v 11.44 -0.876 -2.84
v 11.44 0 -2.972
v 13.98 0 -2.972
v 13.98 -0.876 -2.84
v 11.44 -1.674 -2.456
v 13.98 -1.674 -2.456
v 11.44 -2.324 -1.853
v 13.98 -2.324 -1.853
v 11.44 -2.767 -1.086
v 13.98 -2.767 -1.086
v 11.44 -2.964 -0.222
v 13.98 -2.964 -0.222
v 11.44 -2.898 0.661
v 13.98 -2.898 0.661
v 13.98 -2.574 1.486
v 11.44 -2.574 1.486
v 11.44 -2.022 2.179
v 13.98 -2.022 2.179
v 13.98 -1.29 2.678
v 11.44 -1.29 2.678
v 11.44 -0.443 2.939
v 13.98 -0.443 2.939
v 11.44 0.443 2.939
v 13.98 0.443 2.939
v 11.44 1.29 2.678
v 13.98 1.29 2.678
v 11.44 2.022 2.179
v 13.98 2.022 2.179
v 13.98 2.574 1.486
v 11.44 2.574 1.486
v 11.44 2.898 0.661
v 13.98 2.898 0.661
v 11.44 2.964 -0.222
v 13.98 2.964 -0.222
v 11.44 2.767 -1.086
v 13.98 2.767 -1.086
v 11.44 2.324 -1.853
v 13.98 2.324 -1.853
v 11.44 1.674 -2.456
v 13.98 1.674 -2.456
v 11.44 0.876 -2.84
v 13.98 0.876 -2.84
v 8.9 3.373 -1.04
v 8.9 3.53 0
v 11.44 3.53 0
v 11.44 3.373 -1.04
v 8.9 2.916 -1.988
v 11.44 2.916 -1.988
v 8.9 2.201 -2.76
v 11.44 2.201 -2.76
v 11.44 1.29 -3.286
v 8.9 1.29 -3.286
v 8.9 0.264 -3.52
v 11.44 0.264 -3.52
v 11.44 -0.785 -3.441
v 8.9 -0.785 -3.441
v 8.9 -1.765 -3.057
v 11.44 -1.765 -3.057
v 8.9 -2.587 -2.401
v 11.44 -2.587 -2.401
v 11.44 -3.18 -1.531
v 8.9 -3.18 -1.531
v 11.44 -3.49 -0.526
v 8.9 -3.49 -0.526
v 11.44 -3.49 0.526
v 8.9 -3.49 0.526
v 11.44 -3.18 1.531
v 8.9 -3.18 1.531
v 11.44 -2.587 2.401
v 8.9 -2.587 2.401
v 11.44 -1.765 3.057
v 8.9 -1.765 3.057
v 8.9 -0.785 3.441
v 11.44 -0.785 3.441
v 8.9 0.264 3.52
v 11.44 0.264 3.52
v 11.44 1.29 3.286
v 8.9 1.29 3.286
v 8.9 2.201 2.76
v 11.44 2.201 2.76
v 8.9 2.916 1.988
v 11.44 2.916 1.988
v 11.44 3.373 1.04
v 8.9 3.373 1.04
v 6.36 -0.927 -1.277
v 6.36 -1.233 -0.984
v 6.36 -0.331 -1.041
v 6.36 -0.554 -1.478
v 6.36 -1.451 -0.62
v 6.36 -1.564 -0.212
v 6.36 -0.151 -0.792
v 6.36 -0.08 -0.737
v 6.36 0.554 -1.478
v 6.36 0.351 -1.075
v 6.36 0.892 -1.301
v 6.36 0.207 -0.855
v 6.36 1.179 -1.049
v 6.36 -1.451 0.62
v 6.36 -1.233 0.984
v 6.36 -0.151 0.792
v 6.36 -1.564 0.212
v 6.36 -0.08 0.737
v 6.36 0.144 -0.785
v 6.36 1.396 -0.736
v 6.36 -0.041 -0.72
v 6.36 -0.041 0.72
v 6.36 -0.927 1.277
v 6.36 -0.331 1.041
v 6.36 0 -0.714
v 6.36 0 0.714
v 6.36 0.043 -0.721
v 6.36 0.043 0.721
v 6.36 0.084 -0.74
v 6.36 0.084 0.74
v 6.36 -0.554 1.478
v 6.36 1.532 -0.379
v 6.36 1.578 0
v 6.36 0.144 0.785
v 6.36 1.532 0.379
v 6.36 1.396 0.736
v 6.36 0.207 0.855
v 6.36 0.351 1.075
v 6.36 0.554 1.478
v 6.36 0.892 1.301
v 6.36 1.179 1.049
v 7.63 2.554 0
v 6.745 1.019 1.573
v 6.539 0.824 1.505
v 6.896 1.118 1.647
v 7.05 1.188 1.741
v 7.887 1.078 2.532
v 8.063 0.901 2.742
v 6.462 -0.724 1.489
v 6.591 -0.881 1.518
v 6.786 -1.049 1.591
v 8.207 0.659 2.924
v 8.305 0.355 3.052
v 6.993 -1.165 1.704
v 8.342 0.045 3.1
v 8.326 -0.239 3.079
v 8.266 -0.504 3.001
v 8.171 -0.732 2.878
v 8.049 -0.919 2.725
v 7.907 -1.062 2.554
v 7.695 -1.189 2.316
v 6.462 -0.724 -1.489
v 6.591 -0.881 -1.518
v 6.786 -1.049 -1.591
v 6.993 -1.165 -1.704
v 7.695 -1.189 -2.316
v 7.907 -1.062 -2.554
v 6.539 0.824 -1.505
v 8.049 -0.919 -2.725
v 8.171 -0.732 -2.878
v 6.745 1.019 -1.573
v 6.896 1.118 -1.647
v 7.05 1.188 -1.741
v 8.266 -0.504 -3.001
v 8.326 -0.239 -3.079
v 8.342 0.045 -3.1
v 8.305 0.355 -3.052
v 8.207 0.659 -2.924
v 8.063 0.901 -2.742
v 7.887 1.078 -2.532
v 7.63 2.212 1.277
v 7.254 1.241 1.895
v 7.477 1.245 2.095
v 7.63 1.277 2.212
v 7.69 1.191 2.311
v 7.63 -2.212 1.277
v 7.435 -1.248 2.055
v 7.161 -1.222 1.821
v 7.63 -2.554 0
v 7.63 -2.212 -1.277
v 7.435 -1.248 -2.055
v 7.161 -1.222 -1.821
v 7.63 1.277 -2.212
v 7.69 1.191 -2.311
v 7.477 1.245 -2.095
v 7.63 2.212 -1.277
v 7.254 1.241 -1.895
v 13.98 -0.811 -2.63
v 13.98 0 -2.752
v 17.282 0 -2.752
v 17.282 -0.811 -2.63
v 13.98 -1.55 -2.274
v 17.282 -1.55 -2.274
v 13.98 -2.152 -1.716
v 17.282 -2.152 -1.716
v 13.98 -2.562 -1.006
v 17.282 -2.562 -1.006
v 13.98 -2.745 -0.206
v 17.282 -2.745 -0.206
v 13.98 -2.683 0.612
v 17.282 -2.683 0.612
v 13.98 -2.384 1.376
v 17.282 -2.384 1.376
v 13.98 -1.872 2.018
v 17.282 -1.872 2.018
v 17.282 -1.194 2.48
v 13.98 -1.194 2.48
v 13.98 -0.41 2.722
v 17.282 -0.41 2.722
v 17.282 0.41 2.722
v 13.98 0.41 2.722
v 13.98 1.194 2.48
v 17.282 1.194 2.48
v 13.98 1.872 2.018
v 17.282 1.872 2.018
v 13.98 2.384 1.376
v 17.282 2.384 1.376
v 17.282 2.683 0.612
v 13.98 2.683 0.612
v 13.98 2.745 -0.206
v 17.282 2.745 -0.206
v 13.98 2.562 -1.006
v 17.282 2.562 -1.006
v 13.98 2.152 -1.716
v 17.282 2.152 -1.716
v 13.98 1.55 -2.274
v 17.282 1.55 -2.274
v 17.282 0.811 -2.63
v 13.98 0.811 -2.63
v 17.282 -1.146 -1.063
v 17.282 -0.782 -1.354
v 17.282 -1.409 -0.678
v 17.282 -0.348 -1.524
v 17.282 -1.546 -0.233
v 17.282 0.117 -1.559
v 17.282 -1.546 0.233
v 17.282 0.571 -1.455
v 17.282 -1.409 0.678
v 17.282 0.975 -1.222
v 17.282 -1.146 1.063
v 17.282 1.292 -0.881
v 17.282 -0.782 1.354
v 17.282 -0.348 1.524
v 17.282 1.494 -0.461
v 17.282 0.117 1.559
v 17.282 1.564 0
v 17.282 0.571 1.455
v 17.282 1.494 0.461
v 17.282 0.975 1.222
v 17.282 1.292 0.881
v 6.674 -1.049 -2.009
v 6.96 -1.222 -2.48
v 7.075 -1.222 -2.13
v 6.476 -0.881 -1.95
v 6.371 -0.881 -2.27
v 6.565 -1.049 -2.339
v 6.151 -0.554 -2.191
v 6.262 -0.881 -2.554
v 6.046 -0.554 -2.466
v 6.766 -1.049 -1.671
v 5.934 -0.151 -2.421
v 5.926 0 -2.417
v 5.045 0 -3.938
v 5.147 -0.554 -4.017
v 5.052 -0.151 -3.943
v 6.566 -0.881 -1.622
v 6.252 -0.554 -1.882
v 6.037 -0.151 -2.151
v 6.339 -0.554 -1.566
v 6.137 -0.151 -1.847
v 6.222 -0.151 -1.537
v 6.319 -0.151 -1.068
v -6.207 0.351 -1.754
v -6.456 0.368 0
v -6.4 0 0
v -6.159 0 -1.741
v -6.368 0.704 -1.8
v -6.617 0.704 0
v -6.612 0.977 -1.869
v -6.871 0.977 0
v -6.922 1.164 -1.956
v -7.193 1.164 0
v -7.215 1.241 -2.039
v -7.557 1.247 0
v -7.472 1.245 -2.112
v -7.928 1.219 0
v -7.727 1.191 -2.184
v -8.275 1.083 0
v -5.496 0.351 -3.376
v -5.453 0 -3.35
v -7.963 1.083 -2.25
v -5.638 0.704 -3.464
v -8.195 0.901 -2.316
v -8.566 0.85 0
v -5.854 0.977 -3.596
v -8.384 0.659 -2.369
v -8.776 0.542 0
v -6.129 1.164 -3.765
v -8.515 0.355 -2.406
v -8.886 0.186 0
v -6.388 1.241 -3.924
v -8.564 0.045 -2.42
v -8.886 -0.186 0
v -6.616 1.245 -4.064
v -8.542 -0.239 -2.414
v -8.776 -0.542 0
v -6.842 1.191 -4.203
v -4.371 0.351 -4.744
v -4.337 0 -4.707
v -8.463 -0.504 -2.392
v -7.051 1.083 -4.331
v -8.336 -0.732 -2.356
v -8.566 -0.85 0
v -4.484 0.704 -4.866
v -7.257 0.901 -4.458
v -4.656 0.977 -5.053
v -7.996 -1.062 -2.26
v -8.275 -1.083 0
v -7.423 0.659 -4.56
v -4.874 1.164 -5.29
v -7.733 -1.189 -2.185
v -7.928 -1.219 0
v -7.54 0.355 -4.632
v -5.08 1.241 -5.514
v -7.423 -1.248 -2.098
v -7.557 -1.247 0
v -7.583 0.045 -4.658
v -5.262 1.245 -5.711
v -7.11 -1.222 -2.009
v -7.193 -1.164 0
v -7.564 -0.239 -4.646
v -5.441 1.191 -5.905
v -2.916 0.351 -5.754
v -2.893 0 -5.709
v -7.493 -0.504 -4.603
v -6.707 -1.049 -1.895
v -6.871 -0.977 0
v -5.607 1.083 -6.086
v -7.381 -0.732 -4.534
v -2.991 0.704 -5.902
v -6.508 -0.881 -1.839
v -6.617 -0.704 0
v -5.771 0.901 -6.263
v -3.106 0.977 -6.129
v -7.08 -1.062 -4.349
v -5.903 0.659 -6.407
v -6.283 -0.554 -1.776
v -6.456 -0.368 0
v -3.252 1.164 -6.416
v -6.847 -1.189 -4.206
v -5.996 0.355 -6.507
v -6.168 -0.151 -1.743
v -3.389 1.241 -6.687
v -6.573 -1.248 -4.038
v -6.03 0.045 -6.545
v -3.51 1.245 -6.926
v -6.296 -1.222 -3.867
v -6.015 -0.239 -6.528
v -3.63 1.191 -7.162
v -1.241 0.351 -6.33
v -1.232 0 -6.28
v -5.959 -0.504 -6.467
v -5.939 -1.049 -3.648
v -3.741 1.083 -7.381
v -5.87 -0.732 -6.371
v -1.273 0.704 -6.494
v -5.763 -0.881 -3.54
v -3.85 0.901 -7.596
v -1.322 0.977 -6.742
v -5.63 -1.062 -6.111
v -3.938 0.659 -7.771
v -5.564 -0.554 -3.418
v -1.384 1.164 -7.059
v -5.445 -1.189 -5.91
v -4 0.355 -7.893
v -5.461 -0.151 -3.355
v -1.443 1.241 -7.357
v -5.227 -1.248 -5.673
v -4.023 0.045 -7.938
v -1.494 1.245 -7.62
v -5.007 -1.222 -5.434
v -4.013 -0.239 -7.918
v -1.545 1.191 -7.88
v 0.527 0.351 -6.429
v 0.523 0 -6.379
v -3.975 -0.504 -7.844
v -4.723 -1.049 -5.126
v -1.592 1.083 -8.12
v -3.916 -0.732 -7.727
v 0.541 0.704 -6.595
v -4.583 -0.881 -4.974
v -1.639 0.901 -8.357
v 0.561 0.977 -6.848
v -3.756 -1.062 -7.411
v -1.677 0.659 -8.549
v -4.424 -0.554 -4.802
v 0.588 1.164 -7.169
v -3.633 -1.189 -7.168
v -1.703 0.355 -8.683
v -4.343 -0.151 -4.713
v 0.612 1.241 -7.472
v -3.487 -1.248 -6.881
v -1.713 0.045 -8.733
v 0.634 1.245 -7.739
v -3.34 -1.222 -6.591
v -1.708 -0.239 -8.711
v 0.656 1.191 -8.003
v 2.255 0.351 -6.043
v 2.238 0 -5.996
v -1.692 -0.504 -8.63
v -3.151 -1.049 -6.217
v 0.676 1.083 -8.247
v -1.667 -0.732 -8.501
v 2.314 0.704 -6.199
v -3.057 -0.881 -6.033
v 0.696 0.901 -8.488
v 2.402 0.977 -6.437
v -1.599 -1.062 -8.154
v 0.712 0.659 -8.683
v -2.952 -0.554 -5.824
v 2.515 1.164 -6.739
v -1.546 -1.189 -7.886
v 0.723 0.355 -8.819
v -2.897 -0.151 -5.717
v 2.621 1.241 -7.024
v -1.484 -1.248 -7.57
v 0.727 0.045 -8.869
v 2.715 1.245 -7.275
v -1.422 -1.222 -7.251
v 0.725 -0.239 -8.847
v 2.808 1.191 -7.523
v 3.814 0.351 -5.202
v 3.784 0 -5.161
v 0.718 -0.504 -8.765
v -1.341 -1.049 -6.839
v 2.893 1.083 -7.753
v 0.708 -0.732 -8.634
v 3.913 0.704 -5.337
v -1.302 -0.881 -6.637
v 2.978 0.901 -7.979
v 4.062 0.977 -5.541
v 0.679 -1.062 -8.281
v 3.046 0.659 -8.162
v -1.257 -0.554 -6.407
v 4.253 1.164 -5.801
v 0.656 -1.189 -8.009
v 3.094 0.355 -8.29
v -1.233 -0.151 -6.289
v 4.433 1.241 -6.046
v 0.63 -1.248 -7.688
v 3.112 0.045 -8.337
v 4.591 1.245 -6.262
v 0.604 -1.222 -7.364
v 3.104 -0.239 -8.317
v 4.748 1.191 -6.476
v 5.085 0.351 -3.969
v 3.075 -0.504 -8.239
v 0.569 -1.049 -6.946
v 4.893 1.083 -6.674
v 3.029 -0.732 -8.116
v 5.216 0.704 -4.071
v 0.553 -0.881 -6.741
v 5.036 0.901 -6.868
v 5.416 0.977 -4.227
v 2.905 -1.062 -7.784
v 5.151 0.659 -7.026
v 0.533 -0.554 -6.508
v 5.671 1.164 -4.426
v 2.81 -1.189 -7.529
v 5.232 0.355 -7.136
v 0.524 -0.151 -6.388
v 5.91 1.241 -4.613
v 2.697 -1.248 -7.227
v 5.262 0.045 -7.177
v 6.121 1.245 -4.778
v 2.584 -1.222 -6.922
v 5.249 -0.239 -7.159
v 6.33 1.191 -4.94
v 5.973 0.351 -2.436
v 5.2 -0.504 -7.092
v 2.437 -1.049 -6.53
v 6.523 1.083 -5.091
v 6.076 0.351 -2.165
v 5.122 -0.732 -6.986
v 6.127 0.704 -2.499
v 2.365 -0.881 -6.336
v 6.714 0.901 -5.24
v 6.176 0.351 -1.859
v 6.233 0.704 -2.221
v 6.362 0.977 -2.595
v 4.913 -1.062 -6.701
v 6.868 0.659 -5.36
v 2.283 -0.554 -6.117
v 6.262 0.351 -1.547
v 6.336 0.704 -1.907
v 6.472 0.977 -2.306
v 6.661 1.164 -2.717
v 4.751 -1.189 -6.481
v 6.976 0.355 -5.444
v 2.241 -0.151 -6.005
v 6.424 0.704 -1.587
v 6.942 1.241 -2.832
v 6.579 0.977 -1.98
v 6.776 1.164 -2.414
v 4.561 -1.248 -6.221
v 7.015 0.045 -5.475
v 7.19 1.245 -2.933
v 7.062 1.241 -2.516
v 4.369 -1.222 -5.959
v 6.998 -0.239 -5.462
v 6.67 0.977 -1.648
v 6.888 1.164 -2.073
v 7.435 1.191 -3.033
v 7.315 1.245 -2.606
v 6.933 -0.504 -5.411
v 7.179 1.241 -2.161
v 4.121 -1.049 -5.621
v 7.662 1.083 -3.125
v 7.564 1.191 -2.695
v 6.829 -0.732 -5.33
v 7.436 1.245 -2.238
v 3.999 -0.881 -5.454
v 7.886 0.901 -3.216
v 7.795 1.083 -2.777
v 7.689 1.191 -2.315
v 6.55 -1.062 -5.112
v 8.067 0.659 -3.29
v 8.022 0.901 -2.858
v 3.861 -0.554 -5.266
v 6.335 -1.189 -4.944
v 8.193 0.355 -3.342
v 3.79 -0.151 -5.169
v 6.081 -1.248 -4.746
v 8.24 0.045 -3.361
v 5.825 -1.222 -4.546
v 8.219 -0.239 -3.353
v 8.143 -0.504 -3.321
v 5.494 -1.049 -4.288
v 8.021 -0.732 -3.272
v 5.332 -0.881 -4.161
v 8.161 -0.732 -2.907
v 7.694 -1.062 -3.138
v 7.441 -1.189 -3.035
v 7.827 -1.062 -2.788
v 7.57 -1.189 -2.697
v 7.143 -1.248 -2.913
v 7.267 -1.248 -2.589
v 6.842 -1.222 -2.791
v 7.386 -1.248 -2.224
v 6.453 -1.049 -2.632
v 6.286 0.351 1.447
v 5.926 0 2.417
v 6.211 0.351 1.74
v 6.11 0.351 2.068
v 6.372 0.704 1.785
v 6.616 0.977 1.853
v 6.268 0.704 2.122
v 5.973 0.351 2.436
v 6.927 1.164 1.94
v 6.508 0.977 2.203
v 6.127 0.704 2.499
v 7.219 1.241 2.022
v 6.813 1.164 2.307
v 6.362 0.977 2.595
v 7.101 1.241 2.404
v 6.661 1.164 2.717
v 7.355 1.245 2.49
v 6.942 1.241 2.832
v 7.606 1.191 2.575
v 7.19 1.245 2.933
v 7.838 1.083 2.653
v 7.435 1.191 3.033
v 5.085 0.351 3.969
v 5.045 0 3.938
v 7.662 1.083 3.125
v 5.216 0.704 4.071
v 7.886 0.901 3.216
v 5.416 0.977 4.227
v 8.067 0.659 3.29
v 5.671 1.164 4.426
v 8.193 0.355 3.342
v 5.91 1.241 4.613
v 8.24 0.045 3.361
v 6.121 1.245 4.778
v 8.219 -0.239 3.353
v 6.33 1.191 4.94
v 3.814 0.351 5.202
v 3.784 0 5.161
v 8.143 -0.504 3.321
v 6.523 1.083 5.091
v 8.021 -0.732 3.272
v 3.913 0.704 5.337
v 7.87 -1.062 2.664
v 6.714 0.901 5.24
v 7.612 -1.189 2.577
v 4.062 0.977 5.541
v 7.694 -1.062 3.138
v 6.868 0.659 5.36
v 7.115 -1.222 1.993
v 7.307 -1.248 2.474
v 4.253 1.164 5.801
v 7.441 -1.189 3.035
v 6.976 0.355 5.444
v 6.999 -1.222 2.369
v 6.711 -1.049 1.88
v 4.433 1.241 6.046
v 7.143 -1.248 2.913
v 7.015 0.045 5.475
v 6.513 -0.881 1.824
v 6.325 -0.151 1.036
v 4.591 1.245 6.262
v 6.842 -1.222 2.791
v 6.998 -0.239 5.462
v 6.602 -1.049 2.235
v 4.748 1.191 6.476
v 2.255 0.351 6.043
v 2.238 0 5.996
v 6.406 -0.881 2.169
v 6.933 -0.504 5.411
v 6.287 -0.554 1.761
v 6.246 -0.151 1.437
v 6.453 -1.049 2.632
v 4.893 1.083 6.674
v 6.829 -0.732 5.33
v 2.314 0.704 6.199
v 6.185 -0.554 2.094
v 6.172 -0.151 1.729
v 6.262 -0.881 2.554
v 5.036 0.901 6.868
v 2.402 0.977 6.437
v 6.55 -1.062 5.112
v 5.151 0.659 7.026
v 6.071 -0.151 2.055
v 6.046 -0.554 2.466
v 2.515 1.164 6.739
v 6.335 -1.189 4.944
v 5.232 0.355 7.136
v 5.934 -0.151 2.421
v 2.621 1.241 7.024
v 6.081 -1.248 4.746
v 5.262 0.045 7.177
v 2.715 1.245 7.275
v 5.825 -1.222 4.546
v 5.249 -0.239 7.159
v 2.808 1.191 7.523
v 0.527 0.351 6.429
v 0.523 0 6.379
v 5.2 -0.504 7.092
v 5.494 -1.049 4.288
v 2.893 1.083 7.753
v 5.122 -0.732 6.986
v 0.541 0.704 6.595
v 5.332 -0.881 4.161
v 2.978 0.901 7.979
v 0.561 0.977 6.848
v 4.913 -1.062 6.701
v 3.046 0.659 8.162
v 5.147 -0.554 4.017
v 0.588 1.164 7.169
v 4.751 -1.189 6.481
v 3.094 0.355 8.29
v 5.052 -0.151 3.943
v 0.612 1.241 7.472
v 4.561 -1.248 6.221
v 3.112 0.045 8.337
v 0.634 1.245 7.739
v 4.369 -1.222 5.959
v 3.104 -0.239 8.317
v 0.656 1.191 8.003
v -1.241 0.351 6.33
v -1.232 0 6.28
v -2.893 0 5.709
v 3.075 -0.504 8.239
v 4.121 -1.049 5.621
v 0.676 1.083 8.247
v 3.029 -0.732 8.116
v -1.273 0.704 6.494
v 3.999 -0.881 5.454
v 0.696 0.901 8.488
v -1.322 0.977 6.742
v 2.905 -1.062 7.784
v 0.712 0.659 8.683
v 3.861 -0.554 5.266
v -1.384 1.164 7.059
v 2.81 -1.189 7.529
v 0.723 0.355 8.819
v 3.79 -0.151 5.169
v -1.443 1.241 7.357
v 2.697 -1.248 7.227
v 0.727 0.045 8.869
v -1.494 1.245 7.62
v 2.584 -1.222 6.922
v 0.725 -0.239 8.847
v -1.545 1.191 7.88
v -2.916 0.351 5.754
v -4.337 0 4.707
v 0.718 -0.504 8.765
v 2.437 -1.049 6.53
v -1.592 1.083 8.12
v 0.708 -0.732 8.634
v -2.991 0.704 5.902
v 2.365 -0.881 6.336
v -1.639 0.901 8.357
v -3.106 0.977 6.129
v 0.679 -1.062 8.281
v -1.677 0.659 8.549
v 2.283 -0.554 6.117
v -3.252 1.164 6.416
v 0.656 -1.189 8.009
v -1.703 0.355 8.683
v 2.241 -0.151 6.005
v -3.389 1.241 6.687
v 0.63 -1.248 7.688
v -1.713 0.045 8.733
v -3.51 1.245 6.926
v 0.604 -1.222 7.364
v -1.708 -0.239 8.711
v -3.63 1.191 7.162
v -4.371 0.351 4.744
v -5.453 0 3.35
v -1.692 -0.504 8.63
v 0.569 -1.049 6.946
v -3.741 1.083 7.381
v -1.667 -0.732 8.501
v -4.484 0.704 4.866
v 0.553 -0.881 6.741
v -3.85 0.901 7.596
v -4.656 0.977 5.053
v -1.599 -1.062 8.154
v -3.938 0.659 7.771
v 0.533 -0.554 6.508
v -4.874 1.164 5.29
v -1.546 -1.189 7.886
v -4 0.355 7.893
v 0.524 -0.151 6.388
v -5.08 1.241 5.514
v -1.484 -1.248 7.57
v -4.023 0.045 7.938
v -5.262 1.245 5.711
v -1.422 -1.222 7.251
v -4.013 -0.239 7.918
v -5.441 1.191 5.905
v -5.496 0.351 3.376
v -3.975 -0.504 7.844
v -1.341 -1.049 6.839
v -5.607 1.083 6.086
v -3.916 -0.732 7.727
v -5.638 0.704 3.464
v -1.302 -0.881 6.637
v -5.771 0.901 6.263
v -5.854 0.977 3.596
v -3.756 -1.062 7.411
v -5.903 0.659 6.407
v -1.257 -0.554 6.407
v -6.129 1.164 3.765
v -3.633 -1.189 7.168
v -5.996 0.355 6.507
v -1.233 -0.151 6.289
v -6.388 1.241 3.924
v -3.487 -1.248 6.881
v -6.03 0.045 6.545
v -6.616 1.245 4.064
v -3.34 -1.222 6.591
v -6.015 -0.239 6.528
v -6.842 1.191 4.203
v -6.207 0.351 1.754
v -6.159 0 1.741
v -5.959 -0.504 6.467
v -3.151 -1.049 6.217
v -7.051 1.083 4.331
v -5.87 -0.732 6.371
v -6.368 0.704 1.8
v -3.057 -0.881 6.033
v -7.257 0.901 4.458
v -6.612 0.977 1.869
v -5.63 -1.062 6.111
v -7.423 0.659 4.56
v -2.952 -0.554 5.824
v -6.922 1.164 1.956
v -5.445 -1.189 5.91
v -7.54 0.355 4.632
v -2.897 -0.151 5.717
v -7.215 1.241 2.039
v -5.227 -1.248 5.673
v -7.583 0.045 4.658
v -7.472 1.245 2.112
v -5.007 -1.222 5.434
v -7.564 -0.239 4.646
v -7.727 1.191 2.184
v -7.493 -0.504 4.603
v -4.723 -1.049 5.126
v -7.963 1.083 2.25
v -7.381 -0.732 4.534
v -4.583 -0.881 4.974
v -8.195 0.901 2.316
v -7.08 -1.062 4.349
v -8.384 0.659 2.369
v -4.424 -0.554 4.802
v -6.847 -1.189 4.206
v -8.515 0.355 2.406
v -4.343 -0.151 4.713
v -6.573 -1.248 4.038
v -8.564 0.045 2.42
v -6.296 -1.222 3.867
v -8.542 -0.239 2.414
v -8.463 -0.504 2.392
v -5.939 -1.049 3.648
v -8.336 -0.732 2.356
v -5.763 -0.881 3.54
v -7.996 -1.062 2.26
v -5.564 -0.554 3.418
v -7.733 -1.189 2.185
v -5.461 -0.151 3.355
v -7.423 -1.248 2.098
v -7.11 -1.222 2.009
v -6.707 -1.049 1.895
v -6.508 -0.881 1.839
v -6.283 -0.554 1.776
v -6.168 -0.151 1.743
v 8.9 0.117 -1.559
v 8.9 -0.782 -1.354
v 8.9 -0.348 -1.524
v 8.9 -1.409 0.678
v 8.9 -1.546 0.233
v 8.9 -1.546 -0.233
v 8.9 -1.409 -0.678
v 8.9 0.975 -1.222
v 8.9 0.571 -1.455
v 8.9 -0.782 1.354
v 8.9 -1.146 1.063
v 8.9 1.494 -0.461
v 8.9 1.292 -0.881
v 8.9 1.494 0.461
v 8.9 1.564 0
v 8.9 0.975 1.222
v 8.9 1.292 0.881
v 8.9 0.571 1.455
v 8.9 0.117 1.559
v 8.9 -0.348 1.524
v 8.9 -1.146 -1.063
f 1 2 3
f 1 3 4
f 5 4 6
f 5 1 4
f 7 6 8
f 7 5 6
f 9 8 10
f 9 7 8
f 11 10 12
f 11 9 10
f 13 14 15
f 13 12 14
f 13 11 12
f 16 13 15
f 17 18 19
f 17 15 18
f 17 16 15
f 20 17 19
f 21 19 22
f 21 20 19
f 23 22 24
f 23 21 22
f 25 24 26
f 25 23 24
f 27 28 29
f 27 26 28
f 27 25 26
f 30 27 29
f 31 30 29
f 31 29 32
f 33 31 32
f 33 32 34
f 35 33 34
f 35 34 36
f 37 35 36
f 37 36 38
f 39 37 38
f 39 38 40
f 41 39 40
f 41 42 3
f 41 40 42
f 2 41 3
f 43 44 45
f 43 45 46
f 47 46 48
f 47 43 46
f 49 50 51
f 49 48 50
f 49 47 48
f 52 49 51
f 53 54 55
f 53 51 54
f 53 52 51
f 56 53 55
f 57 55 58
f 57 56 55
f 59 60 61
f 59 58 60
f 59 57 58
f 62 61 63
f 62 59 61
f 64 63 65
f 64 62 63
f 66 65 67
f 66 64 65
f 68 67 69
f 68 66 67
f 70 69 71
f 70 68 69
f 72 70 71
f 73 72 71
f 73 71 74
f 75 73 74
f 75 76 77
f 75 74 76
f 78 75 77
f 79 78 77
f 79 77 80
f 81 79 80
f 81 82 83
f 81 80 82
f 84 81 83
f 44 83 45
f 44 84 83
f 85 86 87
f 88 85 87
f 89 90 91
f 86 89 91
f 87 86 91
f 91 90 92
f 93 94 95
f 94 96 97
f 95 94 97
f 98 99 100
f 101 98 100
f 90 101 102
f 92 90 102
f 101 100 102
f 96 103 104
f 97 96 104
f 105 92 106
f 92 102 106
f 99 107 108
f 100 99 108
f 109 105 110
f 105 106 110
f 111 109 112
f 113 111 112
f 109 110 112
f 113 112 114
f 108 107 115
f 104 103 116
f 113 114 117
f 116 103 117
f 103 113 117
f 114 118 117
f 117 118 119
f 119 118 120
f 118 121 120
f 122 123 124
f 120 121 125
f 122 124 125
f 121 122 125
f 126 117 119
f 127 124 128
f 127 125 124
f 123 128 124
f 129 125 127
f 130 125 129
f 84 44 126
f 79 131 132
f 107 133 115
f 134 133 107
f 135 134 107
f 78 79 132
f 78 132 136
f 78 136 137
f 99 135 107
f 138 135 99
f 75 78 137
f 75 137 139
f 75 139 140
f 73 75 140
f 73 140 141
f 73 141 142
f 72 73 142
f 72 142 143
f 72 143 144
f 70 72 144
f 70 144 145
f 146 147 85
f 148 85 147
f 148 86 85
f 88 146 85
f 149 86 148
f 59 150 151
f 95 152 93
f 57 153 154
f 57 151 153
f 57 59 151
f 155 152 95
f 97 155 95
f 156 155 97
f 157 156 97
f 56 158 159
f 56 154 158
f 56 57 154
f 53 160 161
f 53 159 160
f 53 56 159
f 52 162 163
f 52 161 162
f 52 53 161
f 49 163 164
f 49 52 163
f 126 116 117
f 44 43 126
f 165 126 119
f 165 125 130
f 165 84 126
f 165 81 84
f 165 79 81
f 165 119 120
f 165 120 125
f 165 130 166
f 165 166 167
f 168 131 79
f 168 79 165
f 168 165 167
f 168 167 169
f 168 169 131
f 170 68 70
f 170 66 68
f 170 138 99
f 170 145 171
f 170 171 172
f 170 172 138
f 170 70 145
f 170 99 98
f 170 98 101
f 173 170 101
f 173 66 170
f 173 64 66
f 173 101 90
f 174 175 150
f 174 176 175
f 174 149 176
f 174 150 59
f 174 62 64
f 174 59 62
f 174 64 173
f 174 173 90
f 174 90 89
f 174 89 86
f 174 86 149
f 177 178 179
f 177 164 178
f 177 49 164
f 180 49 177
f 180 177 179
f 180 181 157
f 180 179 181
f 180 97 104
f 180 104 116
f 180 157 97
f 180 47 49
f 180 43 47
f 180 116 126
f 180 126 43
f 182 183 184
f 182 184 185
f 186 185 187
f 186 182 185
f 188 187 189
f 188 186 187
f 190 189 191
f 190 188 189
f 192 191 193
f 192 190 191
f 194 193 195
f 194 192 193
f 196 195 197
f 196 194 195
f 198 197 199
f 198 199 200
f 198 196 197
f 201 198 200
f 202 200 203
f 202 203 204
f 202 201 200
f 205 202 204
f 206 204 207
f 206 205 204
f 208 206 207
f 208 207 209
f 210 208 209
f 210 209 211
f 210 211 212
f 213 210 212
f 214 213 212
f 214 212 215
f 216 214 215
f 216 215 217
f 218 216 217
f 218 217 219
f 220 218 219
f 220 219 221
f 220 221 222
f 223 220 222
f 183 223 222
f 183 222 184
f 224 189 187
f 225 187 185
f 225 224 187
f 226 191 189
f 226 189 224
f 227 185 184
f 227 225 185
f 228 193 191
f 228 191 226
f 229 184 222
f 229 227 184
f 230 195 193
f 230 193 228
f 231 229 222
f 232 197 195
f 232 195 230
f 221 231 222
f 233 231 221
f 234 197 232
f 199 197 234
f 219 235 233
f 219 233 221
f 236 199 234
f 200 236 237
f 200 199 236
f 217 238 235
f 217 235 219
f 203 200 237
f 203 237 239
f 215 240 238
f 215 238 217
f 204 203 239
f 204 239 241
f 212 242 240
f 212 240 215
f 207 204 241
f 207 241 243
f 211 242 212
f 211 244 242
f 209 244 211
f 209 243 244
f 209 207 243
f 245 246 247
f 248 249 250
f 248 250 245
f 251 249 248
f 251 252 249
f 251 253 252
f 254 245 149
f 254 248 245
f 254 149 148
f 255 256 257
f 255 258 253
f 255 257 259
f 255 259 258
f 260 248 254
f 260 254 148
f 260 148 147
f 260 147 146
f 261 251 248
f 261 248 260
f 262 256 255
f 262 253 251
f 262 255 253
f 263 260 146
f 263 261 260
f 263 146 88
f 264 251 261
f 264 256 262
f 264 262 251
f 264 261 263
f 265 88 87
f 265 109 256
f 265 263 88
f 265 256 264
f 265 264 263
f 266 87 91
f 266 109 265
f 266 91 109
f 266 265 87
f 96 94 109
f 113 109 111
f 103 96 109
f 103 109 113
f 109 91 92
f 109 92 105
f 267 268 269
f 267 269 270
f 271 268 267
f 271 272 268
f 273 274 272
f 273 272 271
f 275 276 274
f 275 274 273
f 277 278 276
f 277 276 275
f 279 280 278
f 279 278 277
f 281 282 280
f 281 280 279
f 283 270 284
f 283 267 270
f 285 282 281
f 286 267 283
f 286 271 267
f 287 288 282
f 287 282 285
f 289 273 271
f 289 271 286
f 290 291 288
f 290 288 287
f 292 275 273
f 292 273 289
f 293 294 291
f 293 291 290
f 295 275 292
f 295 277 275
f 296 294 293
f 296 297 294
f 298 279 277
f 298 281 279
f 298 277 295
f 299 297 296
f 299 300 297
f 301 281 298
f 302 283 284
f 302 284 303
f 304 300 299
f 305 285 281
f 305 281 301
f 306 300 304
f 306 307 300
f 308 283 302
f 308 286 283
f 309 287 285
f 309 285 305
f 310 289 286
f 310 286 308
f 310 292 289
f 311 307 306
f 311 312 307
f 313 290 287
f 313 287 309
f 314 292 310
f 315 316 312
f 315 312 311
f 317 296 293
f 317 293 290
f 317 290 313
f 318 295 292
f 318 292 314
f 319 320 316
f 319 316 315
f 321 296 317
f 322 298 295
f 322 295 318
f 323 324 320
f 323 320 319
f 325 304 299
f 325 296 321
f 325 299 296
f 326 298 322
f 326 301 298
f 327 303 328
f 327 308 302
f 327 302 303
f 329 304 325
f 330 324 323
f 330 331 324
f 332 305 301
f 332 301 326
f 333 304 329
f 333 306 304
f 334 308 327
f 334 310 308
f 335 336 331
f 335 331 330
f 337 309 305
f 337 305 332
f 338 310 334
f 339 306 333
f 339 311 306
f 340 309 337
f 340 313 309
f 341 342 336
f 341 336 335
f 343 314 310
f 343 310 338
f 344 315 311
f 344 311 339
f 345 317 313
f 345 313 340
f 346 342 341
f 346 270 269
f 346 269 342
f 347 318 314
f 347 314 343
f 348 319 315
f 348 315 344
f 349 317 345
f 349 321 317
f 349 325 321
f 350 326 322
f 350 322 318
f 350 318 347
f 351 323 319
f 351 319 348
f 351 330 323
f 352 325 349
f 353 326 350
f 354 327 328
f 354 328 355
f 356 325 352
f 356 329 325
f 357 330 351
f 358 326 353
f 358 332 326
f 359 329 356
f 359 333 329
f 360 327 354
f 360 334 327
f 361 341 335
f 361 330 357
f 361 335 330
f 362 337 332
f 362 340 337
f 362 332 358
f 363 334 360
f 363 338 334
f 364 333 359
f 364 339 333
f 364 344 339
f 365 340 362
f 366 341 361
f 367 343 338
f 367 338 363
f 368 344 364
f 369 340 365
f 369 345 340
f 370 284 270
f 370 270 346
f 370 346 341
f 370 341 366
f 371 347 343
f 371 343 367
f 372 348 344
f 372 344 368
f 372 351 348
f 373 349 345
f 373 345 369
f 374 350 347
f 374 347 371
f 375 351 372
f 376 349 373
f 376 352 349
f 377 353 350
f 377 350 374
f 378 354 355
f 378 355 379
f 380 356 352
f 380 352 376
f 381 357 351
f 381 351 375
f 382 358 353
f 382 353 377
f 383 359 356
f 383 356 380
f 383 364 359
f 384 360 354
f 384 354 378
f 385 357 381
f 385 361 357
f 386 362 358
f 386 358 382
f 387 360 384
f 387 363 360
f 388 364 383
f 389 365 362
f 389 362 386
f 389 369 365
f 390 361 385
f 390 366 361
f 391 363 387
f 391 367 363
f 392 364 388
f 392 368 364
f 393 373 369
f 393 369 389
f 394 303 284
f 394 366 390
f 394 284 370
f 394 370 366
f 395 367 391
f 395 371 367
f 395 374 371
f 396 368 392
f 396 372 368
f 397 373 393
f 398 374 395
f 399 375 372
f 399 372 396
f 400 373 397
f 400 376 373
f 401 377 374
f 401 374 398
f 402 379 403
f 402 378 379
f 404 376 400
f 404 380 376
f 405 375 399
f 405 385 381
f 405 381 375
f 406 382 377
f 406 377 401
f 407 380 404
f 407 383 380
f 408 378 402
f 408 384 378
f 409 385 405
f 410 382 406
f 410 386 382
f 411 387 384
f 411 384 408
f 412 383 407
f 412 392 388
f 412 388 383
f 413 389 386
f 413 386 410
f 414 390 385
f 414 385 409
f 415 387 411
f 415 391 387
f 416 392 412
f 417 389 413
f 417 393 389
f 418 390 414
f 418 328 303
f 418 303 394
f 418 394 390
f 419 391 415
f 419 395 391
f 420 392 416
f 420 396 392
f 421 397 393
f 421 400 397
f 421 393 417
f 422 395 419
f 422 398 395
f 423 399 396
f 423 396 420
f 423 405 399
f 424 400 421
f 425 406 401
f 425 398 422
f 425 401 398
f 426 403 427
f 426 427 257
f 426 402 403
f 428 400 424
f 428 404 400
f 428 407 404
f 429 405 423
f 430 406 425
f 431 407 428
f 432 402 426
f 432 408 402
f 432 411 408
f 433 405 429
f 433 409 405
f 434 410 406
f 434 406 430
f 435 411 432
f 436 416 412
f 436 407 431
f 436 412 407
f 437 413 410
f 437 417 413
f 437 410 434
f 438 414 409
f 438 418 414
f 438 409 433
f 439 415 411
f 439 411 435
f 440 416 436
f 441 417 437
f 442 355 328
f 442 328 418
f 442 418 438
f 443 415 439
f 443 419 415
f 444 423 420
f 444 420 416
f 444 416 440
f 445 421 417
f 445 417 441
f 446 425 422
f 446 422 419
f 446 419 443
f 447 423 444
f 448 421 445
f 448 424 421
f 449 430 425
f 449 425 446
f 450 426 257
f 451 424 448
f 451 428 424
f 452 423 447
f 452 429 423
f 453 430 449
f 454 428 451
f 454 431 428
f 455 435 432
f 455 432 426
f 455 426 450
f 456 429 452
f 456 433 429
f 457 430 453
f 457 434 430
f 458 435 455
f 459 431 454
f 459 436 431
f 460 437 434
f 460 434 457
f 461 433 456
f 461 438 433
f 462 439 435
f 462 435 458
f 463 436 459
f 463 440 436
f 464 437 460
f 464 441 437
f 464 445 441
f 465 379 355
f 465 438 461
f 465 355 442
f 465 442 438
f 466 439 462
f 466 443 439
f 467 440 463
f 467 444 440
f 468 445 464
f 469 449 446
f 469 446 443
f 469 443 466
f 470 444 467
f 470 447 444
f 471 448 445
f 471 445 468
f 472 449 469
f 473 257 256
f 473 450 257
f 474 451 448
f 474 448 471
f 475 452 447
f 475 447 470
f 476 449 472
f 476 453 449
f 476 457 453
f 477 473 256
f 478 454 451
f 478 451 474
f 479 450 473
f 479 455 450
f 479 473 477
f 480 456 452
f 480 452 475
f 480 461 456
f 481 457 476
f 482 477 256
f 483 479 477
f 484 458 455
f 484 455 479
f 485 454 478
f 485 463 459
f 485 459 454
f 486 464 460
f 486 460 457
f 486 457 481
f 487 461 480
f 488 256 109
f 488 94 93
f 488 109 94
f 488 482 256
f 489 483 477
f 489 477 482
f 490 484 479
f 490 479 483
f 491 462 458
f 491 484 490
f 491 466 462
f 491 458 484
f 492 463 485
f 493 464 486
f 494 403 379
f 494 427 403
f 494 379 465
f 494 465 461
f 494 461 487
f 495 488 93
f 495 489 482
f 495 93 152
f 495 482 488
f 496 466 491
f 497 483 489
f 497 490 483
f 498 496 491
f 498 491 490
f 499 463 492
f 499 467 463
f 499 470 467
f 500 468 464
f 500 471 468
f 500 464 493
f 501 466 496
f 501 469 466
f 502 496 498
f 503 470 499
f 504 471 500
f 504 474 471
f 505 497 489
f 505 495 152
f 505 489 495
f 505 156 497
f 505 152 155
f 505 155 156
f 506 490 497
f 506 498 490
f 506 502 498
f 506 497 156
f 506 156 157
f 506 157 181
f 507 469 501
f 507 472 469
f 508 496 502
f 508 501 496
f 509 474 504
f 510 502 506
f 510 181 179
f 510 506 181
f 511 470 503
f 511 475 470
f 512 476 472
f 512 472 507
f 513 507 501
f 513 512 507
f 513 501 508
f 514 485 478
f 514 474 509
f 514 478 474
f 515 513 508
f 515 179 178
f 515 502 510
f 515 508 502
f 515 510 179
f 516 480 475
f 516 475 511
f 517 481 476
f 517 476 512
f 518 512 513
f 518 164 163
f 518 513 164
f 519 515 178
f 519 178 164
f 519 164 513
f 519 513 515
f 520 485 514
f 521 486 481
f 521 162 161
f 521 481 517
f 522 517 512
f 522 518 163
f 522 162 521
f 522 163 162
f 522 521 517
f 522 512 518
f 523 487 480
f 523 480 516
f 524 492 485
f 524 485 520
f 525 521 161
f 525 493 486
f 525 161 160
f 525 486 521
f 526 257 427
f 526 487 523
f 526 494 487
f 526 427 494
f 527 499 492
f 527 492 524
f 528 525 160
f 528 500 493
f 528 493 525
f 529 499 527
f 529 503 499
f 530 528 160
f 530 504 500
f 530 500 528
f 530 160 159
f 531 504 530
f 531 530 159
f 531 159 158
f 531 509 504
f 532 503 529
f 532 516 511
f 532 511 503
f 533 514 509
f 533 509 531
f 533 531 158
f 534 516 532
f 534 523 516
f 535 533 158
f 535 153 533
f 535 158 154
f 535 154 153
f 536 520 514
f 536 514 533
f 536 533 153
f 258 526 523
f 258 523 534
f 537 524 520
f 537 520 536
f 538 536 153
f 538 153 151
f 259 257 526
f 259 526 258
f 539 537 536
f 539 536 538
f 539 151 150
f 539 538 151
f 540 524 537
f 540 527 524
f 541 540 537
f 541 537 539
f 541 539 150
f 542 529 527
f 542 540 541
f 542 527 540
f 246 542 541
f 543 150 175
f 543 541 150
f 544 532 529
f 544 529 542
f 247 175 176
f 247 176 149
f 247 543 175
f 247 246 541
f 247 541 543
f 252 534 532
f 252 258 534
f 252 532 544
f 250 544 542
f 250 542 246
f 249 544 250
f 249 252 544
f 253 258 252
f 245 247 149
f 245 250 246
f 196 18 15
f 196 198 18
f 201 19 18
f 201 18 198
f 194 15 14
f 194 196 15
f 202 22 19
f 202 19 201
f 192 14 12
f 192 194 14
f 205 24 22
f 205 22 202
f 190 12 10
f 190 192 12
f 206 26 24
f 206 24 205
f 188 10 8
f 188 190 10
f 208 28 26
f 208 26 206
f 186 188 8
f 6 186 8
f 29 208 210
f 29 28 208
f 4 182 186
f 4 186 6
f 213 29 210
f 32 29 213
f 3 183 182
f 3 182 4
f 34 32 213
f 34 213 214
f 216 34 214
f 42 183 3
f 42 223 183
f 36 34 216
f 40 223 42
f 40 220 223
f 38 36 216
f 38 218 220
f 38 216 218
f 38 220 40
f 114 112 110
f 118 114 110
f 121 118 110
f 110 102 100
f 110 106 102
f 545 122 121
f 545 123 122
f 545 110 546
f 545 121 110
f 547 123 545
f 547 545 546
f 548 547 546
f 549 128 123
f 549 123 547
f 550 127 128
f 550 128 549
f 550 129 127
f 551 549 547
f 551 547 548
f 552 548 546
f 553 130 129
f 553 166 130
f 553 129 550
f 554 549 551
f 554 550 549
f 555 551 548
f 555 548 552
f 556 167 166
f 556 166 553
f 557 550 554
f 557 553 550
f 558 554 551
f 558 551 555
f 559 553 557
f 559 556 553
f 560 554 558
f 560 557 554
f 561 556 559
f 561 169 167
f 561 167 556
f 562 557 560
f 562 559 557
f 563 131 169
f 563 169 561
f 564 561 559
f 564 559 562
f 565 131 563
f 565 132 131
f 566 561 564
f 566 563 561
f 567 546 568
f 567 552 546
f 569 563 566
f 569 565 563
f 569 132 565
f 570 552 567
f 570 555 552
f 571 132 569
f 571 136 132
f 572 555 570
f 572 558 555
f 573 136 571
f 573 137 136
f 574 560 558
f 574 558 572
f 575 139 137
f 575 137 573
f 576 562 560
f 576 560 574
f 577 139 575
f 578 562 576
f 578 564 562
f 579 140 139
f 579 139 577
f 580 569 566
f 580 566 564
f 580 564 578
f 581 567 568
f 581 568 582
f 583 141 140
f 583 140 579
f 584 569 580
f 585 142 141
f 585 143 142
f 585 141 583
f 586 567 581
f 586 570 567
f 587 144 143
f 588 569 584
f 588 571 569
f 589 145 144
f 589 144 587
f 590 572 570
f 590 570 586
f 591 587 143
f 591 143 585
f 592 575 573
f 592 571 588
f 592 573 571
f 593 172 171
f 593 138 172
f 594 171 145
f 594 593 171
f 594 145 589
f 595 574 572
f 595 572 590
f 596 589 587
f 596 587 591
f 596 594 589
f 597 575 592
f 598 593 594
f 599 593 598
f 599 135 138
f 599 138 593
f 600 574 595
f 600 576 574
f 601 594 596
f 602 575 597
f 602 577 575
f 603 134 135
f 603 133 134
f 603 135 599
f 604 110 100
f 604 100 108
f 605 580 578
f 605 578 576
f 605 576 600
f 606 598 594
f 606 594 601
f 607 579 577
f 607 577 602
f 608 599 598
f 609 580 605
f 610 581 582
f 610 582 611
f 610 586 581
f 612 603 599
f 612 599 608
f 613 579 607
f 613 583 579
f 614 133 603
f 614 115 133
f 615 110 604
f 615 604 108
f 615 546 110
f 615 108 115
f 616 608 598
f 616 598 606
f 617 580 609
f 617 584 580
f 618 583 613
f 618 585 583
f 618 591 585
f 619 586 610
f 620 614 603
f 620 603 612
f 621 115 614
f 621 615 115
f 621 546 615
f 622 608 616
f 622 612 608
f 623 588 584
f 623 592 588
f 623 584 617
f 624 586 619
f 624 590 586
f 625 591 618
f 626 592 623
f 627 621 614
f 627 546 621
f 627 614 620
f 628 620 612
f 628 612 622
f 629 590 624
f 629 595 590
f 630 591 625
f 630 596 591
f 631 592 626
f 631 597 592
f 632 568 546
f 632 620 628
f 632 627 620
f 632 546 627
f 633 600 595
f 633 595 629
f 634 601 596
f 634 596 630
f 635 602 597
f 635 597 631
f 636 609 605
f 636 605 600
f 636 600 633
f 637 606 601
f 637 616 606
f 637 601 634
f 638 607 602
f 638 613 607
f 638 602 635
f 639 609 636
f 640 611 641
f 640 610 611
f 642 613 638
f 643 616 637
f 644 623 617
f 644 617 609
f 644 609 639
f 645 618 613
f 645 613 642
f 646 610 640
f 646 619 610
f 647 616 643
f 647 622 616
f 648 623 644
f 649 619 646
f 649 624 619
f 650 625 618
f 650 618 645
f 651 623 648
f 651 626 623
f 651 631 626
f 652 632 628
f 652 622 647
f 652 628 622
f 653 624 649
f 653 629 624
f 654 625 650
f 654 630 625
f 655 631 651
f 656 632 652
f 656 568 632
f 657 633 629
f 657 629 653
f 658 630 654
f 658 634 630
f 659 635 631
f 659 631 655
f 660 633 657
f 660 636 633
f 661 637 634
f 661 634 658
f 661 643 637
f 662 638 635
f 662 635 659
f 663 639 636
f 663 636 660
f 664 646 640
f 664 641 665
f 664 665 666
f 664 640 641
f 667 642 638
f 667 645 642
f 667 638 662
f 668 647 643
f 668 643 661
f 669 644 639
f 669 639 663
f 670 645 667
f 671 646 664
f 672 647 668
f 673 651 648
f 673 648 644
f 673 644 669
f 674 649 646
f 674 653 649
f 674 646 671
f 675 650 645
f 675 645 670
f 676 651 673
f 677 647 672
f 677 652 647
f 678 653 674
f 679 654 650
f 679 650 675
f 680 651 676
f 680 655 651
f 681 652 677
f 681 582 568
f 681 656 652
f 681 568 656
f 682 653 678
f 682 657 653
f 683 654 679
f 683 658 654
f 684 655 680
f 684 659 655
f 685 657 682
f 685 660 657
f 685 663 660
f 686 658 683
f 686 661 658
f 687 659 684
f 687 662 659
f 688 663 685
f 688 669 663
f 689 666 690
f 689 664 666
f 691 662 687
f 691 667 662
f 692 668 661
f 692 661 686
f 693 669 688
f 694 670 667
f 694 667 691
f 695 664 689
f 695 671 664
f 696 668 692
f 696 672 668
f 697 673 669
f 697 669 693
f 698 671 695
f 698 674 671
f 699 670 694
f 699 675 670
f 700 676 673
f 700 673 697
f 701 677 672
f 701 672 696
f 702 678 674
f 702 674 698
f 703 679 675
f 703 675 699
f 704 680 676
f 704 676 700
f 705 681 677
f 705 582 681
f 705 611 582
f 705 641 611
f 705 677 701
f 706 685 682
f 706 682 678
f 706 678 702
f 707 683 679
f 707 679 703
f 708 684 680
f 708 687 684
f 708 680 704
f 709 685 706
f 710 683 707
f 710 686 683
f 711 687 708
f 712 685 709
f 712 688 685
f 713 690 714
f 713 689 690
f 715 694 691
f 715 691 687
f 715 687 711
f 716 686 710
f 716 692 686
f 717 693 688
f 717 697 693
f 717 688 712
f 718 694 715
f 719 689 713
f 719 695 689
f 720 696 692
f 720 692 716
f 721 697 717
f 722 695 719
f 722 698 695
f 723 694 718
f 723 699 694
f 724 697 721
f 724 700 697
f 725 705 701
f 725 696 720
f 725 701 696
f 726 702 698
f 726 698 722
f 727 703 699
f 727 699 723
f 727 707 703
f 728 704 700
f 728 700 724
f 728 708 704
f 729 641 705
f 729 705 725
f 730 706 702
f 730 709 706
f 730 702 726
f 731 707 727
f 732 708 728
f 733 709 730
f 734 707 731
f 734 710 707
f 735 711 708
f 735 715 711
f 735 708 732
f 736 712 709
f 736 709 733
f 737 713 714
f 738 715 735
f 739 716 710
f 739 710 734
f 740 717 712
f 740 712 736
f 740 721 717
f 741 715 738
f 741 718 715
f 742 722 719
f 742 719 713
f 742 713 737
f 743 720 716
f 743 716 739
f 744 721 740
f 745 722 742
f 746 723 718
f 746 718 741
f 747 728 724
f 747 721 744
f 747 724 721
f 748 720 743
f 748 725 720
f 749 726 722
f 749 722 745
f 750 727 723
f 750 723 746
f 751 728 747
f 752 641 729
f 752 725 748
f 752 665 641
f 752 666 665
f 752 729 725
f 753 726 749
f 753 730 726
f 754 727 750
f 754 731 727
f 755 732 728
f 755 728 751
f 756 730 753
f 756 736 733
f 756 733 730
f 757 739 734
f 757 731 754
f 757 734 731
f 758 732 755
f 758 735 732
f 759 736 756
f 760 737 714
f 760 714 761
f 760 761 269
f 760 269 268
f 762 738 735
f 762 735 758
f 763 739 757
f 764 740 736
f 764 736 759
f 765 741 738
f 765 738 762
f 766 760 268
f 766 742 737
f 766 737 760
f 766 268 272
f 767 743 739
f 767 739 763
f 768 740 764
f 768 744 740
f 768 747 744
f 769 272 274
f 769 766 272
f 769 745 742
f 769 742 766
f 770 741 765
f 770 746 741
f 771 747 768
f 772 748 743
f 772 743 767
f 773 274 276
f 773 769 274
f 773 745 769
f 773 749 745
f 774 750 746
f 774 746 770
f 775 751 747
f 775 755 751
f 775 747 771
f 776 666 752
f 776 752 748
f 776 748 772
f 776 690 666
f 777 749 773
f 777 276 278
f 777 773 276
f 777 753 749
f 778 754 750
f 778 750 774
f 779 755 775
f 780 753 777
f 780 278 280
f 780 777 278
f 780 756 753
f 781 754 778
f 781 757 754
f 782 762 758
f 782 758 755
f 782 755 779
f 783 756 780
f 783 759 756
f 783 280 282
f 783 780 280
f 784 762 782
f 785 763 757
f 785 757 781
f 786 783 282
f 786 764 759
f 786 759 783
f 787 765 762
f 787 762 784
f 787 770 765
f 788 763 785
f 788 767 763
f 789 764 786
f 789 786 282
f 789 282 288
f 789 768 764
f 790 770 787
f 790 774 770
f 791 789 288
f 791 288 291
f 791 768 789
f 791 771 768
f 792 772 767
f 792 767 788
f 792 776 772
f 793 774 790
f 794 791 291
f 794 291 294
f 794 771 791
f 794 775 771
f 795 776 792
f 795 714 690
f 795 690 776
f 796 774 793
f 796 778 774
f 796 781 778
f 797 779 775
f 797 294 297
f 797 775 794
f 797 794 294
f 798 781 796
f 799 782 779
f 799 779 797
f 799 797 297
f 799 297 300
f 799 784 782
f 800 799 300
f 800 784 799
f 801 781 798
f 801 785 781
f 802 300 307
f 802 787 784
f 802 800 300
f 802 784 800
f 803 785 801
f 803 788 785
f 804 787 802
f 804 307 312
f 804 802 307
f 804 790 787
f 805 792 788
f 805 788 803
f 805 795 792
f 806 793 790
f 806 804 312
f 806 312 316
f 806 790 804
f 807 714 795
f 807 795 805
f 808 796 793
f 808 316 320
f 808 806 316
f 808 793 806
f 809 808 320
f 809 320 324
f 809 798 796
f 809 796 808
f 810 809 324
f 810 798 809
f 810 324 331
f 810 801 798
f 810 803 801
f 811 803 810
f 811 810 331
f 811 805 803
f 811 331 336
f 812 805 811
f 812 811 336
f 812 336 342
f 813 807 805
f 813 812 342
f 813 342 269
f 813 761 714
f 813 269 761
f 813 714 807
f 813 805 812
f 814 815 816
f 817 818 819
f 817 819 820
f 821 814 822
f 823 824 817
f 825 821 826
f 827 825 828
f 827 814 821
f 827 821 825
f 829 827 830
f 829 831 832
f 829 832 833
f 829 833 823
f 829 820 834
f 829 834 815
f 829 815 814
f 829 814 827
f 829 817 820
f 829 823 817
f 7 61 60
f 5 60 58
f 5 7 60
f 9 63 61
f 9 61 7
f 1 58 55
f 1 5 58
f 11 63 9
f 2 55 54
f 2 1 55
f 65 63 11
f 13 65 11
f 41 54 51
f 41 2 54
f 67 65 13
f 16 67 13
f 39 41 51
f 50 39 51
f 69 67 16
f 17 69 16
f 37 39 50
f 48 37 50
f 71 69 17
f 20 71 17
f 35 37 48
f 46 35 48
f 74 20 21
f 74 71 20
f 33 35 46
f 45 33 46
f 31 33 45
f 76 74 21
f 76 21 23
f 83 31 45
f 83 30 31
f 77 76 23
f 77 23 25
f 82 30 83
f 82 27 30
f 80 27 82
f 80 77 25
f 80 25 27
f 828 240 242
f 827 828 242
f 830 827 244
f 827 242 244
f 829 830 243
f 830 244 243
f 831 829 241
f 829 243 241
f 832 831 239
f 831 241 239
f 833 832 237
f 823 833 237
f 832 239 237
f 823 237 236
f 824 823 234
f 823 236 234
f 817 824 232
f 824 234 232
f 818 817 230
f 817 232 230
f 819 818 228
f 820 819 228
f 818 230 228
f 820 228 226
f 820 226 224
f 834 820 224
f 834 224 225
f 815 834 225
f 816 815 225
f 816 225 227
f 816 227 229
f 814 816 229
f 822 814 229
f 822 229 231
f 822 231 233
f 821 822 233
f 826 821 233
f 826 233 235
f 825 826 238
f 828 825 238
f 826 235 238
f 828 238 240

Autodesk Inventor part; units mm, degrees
ref_plane "XZ Plane" through (0, 0, 0) normal (0, 1, 0) x (-1, 0, 0)
ref_plane "XY Plane" through (0, 0, 0) normal (0, 0, 1) x (1, 0, 0)
sketch "Sketch1" plane through (0, 0, 0) normal (0, 0, 1) x (1, 0, 0)
  circle A0 centre (-7.65, 0) radius 1.25
  line L0 (0, 4.1624) -> (0, -4.1624)
  point P0 (0, 0)
  dimension "d0" = 2.5
revolve "Revolution1" add sketch "Sketch1" angle 360 about axis through (0, 4.1624, 0) along (0, -1, 0)
ref_plane "Work Plane1" through (21.6, 0, 0) normal (1, 0, 0) x (0, 1, 0)
sketch "Sketch2" plane through (21.6, 0, 0) normal (1, 0, 0) x (0, 1, 0)
  circle A0 centre (0, 0) radius 1.5
  circle A1 centre (0, 0) radius 2.5
  dimension "d3" = 3
  dimension "d4" = 5
ref_plane "Work Plane2" through (8.9, 0, 0) normal (1, 0, 0) x (0, 1, 0)
sketch "Sketch3" plane through (8.9, 0, 0) normal (1, 0, 0) x (0, 1, 0)
  circle A0 centre (0, 0) radius 3.5297
  circle A1 centre (0, 0) radius 1.487
extrude "Extrusion1" add sketch "Sketch3" along normal blind 2.54
extrude "Extrusion2" add sketch "Sketch2" against normal blind 2.54
sketch "Sketch5" plane through (11.44, 0, 0) normal (1, 0, 0) x (0, 0, -1)
  circle A0 centre (0, 0) radius 1.5
  circle A1 centre (0, 0) radius 2.9723
sketch "Sketch6" plane through (19.06, 0, 0) normal (-1, 0, 0) x (0, 0, 1)
  circle A0 centre (0, 0) radius 2.5 projected
  circle A1 centre (0, 0) radius 1.5
  circle A2 centre (0, 0) radius 2.5
sketch "Sketch7" plane through (0, 0, 0) normal (0, 1, 0) x (-1, 0, 0)
  point P0 (0, 0)
extrude "Extrusion3" add sketch "Sketch5" along normal blind 2.54
sketch "Sketch8" plane through (13.98, 0, 0) normal (1, 0, 0) x (0, 0, -1)
  circle A0 centre (0, 0) radius 1.487
  circle A1 centre (0, 0) radius 2.7524
extrude "Extrusion4" add sketch "Sketch8" along normal blind 5.588
sketch "Sketch9" plane through (8.9, 0, 0) normal (1, 0, 0) x (0, 1, 0)
  circle A0 centre (0, 0) radius 3.5297
ref_plane "Work Plane3" through (6.36, 0, 0) normal (1, 0, 0) x (0, 1, 0)
sketch "Sketch10" plane through (6.36, 0, 0) normal (1, 0, 0) x (0, 1, 0)
  circle A0 centre (0, 0) radius 1.578
loft "Loft1" add profiles "Sketch10" section 2 edges at (8.9, -3.5297, 0)
sketch "Sketch11" plane through (21.6, 0, 0) normal (1, 0, 0) x (0, 1, 0)
  circle A0 centre (0, 0) radius 1.5635
extrude "Extrusion5" cut sketch "Sketch11" against normal blind 12.7
sketch "Sketch12" plane through (21.6, 0, 0) normal (1, 0, 0) x (0, 1, 0)
  circle A0 centre (0, 0) radius 1.5635
  circle A1 centre (0, 0) radius 3.9487
extrude "Extrusion6" cut sketch "Sketch12" against normal blind 4.318
properties part number "kims_perch2020"
